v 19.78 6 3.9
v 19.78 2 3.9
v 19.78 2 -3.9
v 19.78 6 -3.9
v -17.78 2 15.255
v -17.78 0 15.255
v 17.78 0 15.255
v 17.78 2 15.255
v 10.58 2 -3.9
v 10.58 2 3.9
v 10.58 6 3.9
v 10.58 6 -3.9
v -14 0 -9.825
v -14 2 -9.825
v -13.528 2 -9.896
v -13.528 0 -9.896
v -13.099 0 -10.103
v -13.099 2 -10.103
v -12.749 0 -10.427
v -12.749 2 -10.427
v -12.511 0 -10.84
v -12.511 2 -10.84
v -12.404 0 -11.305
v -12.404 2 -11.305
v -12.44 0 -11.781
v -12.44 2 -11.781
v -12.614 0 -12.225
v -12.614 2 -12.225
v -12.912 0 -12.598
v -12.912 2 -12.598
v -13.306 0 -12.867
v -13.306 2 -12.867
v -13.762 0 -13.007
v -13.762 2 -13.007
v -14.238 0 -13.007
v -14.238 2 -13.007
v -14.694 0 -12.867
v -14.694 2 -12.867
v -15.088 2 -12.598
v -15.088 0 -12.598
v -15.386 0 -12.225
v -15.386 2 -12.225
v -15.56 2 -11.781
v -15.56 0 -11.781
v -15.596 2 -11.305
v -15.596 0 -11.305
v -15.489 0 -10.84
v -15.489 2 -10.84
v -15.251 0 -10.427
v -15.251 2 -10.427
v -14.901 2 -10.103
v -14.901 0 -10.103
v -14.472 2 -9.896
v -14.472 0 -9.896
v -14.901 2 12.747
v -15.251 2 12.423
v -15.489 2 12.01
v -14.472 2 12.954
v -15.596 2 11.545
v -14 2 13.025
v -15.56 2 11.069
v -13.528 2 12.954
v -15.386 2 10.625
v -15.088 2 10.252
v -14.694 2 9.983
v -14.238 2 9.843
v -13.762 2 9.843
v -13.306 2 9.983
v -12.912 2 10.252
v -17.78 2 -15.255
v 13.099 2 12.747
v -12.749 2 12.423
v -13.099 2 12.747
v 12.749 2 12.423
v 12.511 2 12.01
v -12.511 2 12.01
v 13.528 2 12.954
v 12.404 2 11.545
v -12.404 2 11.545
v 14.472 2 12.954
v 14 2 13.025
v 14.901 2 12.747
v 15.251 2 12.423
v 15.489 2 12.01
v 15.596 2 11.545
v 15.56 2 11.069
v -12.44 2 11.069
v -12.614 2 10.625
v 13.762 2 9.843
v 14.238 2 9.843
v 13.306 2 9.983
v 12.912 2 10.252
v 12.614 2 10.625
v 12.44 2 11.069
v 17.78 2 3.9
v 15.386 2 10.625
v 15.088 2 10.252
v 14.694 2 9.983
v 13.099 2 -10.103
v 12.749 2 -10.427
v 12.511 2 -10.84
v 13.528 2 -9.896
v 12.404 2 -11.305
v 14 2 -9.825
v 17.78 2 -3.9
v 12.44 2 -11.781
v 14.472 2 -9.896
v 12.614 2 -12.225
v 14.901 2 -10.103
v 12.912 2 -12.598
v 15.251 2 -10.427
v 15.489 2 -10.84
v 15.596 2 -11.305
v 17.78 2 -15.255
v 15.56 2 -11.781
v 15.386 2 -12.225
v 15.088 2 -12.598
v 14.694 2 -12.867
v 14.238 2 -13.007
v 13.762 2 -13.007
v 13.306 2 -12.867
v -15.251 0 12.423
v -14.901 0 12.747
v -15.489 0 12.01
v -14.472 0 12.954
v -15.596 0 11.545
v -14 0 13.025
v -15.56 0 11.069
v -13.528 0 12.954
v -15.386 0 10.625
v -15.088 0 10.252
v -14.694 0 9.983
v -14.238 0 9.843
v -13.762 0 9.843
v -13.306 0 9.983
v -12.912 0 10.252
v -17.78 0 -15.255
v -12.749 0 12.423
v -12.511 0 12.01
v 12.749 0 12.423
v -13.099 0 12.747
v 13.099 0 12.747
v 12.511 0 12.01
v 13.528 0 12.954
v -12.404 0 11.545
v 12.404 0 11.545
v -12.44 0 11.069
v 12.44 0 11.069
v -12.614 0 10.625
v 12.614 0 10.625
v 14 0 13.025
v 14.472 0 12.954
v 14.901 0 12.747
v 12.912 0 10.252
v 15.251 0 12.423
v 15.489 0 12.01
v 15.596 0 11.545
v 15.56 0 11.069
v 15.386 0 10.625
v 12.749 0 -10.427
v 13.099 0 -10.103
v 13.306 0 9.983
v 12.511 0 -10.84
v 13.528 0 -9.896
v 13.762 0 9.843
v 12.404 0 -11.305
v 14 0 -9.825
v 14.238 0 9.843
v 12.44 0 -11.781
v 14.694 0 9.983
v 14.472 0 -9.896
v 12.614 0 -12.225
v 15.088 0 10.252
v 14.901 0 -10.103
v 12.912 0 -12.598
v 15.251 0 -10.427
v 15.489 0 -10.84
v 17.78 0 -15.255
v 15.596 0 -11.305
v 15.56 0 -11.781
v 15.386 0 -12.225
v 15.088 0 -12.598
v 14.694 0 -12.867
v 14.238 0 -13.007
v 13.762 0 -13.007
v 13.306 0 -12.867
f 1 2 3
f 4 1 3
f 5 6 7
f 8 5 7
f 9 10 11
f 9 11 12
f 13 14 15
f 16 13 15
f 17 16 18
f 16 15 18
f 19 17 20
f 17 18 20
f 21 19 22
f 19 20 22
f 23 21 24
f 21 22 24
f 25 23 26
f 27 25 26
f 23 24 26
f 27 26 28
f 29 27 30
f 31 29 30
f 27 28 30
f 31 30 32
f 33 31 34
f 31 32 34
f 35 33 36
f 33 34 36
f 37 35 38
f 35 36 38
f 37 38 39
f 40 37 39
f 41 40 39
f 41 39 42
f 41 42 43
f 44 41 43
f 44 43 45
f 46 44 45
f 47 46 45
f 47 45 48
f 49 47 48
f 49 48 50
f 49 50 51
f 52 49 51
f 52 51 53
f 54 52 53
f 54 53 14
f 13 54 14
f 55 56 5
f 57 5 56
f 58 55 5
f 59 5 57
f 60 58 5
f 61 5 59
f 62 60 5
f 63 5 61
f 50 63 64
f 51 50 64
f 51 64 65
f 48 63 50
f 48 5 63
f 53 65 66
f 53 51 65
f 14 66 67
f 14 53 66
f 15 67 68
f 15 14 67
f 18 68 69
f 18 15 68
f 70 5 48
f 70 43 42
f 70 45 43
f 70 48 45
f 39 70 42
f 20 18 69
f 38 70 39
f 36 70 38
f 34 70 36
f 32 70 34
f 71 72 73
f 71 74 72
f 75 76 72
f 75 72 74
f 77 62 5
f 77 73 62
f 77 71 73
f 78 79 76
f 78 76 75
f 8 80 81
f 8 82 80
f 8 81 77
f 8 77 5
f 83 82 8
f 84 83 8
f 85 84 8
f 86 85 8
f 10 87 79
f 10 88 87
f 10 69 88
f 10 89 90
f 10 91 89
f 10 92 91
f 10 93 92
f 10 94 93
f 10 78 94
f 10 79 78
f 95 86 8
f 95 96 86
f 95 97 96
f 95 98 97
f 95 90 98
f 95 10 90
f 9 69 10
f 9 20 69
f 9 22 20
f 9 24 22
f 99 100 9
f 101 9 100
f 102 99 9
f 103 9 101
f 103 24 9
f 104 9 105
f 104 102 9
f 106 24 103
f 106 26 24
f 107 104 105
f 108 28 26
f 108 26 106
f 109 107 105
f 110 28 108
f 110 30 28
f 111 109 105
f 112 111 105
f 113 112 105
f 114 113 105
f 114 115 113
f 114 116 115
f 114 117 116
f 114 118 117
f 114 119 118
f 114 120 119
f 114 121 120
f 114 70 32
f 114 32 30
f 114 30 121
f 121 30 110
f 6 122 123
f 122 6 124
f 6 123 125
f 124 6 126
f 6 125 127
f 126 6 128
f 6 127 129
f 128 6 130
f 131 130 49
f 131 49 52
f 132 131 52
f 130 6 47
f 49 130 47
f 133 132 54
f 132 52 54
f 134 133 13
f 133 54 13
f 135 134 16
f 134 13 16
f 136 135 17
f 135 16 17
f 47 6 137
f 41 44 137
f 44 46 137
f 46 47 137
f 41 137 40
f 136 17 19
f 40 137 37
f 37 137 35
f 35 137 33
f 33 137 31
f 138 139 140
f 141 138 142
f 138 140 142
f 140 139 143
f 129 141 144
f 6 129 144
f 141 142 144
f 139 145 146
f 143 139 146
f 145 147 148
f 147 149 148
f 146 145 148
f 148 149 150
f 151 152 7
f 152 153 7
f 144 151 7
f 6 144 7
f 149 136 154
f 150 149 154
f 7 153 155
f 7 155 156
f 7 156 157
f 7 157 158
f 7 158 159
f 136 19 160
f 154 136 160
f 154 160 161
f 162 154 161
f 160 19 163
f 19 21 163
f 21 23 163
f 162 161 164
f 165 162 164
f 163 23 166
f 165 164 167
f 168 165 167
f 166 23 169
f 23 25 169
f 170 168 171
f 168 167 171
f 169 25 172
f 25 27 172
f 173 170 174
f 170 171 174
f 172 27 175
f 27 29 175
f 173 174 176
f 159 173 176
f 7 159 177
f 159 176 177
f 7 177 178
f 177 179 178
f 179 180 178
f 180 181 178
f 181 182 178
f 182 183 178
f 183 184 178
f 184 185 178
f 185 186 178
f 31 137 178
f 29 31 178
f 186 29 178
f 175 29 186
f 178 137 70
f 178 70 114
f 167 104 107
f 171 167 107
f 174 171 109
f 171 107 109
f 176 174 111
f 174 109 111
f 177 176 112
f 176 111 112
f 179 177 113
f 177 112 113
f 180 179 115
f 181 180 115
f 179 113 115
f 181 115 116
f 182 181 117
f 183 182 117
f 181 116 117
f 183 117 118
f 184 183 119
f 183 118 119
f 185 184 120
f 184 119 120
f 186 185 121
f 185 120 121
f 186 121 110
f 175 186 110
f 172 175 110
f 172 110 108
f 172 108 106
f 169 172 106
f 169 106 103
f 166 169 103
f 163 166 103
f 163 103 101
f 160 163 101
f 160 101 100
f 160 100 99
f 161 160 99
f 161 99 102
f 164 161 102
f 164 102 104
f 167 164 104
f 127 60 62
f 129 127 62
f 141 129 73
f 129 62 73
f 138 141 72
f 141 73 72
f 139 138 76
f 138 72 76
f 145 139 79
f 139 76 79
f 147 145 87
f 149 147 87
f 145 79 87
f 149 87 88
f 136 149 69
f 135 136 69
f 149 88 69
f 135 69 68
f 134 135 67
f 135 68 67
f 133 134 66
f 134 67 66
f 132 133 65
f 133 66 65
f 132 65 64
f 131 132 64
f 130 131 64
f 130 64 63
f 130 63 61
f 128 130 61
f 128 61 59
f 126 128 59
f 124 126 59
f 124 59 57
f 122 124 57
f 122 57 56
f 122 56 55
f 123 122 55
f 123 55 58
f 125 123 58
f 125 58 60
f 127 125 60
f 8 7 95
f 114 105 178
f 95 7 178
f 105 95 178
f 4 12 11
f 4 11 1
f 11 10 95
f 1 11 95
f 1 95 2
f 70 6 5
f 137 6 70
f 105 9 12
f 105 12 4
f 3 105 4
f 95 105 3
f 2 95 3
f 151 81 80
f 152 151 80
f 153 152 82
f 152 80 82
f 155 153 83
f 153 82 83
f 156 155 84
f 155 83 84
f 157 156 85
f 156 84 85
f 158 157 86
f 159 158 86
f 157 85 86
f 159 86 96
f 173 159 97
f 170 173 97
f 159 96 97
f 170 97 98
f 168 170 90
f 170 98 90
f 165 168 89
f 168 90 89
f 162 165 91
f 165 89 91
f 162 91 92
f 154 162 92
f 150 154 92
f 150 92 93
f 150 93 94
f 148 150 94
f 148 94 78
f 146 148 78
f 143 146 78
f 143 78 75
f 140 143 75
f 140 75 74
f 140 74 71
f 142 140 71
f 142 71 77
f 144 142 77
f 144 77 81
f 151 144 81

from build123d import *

# Parameters (mm, degrees)
SKETCH1_W           = 35.56
SKETCH1_H           = 30.51
BOSS_EXTRUDE1_DEPTH = 2
SKETCH2_R           = 1.6
CUT_EXTRUDE1_DEPTH  = 24.512622674
SKETCH3_W           = 9.2
SKETCH3_H           = 7.8
BOSS_EXTRUDE2_DEPTH = 4


with BuildPart() as part:
    # Sketch1 → Boss-Extrude1 (new body)
    with BuildSketch(Plane(origin=(0, 0, 0), x_dir=(1, 0, 0), z_dir=(0, 1, 0))):
        Rectangle(SKETCH1_W, SKETCH1_H)
    extrude(amount=BOSS_EXTRUDE1_DEPTH)

    # Sketch2 → Cut-Extrude1 (cut, through all)
    with BuildSketch(Plane(origin=(0, 2, 0), x_dir=(1, 0, 0), z_dir=(0, 1, 0))):
        with Locations(Location((-14, 11.425, 0), (0, 0, 270))):
            Circle(SKETCH2_R)
        with Locations(Location((14, 11.425, 0), (0, 0, 270))):
            Circle(SKETCH2_R)
        with Locations(Location((14, -11.425, 0), (0, 0, 270))):
            Circle(SKETCH2_R)
        with Locations(Location((-14, -11.425, 0), (0, 0, 270))):
            Circle(SKETCH2_R)
    extrude(amount=-CUT_EXTRUDE1_DEPTH, mode=Mode.SUBTRACT)

    # Sketch3 → Boss-Extrude2 (add)
    with BuildSketch(Plane(origin=(0, 2, 0), x_dir=(1, 0, 0), z_dir=(0, 1, 0))):
        with Locations((15.18, 0)):
            Rectangle(SKETCH3_W, SKETCH3_H)
    extrude(amount=BOSS_EXTRUDE2_DEPTH)


solid = part.part
